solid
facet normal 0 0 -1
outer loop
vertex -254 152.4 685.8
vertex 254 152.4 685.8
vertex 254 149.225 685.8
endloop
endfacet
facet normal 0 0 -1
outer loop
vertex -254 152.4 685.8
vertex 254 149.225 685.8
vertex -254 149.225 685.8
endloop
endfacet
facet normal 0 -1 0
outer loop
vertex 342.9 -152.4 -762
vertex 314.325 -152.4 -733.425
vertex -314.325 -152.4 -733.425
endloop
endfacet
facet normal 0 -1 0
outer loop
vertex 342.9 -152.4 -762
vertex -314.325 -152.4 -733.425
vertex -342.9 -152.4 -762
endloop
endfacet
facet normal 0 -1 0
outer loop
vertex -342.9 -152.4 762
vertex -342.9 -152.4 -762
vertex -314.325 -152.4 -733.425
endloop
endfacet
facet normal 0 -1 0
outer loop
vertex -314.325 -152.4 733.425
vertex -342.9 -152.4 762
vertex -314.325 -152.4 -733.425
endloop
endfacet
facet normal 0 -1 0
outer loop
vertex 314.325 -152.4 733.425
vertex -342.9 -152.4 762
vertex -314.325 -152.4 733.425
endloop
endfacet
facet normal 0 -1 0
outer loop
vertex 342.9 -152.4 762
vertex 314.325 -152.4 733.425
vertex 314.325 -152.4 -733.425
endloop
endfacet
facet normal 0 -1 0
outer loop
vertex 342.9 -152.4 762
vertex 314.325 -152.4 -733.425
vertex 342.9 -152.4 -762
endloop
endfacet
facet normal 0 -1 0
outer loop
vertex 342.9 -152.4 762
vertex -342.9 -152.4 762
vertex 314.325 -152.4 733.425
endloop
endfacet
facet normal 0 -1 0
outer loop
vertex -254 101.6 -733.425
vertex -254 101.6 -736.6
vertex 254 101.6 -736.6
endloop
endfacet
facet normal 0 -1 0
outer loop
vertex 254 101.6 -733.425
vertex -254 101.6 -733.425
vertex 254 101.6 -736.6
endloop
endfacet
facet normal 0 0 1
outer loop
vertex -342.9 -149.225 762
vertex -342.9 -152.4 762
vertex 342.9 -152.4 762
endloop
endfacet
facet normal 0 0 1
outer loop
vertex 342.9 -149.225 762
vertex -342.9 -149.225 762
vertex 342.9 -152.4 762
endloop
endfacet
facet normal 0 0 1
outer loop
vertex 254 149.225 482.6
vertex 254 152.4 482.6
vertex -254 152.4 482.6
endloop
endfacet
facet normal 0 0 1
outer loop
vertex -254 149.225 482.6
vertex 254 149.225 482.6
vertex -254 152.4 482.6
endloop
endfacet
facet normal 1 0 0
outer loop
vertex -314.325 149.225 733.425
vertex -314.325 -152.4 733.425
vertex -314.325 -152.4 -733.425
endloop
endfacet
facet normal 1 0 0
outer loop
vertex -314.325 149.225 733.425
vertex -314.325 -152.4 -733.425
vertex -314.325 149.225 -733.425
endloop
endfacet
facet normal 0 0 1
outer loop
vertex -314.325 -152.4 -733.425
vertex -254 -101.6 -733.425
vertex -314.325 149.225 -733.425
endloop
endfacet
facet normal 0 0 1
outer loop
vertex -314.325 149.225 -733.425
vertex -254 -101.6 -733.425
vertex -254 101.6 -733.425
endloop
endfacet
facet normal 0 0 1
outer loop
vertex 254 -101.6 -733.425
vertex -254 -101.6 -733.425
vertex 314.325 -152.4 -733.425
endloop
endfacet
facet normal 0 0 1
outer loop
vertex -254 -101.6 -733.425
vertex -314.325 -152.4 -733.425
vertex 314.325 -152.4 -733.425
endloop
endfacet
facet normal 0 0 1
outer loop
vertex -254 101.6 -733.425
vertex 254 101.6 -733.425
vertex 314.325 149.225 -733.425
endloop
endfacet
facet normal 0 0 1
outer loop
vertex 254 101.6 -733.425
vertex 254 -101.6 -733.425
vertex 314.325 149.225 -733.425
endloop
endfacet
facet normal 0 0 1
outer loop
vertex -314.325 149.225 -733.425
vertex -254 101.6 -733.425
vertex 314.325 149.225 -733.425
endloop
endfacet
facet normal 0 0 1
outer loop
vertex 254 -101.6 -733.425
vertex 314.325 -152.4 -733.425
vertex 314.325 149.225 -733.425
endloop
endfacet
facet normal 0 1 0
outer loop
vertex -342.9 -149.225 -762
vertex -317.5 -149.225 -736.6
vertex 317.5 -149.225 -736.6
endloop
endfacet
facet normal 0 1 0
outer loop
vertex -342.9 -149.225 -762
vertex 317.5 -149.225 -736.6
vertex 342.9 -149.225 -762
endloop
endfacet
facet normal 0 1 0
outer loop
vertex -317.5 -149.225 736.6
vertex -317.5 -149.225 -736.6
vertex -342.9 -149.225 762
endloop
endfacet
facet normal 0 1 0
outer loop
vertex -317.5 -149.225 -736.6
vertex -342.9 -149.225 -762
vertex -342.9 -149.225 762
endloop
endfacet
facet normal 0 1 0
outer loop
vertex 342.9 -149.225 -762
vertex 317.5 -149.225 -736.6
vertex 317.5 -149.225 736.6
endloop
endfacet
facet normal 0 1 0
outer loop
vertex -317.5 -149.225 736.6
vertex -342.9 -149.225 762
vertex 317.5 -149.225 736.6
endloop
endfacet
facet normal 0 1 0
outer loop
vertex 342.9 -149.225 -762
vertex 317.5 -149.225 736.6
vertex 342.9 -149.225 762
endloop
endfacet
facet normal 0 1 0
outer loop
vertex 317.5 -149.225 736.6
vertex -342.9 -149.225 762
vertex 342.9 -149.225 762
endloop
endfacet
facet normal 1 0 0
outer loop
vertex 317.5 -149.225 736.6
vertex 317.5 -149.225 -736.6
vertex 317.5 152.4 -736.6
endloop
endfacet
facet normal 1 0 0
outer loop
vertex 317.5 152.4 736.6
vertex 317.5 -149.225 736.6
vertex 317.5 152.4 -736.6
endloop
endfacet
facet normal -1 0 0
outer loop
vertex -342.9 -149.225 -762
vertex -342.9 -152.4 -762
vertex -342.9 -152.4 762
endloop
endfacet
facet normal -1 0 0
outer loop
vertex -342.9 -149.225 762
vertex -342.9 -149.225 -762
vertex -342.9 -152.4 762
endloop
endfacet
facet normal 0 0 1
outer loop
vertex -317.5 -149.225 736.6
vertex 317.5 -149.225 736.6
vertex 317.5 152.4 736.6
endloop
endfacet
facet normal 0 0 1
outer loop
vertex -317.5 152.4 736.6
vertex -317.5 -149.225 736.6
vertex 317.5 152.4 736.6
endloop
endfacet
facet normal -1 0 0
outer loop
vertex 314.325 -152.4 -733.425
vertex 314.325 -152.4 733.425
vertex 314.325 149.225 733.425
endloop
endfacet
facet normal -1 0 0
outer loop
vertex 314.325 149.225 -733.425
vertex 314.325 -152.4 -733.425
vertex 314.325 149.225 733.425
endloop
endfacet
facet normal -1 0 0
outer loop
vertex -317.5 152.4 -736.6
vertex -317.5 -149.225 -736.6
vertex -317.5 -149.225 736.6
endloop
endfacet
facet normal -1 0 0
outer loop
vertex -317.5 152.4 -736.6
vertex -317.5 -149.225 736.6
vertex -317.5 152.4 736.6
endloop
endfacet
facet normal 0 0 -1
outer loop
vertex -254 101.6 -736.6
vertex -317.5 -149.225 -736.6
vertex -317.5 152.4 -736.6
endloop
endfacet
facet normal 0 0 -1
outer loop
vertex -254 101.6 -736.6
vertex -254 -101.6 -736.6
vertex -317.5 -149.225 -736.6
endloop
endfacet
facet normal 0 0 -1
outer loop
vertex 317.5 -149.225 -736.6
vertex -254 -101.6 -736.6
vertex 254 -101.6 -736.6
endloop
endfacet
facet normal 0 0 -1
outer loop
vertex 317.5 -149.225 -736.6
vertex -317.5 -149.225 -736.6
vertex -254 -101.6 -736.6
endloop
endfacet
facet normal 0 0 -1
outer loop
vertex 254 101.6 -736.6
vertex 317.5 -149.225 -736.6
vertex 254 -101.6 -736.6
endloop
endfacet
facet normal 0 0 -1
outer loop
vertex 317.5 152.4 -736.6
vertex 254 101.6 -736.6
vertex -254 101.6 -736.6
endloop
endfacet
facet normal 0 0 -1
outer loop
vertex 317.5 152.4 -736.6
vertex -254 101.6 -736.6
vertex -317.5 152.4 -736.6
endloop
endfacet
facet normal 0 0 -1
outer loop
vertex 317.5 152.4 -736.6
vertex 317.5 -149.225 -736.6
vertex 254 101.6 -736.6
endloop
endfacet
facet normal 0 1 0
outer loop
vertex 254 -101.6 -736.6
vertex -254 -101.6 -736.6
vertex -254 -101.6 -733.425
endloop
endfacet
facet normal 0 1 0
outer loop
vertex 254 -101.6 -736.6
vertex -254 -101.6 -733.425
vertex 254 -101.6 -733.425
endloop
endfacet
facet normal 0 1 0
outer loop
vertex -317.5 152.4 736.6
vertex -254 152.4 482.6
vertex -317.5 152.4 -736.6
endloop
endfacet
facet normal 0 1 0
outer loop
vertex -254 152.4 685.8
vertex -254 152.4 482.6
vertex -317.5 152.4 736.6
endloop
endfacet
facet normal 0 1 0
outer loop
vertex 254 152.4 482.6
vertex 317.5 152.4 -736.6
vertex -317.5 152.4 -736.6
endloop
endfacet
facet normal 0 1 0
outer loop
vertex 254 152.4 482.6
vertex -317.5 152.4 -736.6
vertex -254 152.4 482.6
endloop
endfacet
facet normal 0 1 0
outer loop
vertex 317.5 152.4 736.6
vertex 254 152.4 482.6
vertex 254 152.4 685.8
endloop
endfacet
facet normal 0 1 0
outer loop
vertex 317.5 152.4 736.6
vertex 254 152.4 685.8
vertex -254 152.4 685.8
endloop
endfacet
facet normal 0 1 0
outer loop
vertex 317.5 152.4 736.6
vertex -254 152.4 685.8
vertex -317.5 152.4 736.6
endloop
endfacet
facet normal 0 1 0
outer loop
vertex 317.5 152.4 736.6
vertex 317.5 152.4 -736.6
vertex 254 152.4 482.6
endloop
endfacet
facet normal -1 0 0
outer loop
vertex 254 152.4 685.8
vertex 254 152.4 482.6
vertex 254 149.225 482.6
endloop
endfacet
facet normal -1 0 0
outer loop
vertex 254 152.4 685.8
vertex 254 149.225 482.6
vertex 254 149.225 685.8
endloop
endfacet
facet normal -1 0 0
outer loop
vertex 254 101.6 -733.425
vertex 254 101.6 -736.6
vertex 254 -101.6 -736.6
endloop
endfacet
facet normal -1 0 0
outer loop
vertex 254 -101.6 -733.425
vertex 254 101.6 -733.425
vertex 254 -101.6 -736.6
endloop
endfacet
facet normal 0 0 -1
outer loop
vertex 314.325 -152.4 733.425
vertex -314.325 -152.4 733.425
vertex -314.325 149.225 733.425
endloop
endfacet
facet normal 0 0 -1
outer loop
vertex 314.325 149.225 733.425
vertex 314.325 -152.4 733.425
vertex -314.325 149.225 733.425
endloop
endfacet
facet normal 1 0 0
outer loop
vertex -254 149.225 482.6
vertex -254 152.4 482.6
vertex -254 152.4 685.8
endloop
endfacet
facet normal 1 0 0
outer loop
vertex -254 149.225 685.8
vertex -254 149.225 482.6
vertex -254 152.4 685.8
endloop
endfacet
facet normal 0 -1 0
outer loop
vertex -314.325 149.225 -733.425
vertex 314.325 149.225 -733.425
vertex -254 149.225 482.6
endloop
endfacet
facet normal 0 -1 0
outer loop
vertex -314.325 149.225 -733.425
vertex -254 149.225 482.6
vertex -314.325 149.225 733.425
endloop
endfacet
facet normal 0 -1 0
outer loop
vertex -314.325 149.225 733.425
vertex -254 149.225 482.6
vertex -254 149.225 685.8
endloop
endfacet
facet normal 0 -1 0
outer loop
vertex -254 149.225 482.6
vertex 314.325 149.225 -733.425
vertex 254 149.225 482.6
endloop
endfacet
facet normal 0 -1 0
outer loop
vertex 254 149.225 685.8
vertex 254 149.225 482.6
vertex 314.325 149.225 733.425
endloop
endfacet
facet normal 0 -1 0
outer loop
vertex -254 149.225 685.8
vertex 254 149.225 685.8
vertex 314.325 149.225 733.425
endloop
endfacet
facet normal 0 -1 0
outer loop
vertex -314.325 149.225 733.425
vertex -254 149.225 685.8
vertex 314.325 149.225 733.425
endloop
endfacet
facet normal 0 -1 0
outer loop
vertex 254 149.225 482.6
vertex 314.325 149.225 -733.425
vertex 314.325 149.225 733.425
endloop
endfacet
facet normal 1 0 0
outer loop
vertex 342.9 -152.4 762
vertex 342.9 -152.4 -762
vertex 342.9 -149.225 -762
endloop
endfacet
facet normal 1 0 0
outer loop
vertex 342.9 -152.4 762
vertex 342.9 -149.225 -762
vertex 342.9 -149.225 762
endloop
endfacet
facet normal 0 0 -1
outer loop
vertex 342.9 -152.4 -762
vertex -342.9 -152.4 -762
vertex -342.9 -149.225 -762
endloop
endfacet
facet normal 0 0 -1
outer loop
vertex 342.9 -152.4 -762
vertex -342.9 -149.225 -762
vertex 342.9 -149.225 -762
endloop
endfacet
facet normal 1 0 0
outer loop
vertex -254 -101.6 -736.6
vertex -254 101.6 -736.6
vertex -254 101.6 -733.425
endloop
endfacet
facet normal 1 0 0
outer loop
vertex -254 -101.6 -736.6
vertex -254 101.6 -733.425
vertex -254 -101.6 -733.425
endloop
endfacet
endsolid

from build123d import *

# Parameters (mm, degrees)
F0_W     = 304.8
F0_H     = 1473.2
F1_DEPTH = 317.5
F2_T     = -3.175
F3_W     = 685.8
F3_H     = 1524
F3_W_2   = 628.65
F3_H_2   = 1466.85
F4_DEPTH = 3.175
F5_W     = 508
F5_H     = 203.2
F6_DEPTH = 304.801
F7_W     = 508
F7_H     = 203.2
F8_DEPTH = 3.175


with BuildPart() as f1:
    # F0 (on Right) → F1 (new body, symmetric)
    with BuildSketch(Plane.YZ):
        Rectangle(F0_W, F0_H)
    extrude(amount=F1_DEPTH, both=True)

    # F2
    f2_openings = [f1.faces().sort_by_distance(p)[0] for p in [
        (0, -152.4, 0),
    ]]
    offset(amount=F2_T, openings=f2_openings)

    # F3 (on face) → F4 (join)
    with BuildSketch(Plane.XZ.offset(152.4)):
        Rectangle(F3_W, F3_H)
        Rectangle(F3_W_2, F3_H_2, mode=Mode.SUBTRACT)
    extrude(amount=-F4_DEPTH)

    # F5 (on face) → F6 (cut, through all)
    with BuildSketch(Plane(origin=(0, 152.4, 0), x_dir=(-1, 0, 0), z_dir=(0, 1, 0))):
        with Locations((0, 584.2)):
            Rectangle(F5_W, F5_H)
    extrude(amount=-F6_DEPTH, mode=Mode.SUBTRACT)

    # F7 (on face) → F8 (cut, through all)
    with BuildSketch(Plane(origin=(0, 0, -736.6), x_dir=(1, 0, 0), z_dir=(0, 0, -1))):
        Rectangle(F7_W, F7_H)
    extrude(amount=-F8_DEPTH, mode=Mode.SUBTRACT)


solid = f1.part
